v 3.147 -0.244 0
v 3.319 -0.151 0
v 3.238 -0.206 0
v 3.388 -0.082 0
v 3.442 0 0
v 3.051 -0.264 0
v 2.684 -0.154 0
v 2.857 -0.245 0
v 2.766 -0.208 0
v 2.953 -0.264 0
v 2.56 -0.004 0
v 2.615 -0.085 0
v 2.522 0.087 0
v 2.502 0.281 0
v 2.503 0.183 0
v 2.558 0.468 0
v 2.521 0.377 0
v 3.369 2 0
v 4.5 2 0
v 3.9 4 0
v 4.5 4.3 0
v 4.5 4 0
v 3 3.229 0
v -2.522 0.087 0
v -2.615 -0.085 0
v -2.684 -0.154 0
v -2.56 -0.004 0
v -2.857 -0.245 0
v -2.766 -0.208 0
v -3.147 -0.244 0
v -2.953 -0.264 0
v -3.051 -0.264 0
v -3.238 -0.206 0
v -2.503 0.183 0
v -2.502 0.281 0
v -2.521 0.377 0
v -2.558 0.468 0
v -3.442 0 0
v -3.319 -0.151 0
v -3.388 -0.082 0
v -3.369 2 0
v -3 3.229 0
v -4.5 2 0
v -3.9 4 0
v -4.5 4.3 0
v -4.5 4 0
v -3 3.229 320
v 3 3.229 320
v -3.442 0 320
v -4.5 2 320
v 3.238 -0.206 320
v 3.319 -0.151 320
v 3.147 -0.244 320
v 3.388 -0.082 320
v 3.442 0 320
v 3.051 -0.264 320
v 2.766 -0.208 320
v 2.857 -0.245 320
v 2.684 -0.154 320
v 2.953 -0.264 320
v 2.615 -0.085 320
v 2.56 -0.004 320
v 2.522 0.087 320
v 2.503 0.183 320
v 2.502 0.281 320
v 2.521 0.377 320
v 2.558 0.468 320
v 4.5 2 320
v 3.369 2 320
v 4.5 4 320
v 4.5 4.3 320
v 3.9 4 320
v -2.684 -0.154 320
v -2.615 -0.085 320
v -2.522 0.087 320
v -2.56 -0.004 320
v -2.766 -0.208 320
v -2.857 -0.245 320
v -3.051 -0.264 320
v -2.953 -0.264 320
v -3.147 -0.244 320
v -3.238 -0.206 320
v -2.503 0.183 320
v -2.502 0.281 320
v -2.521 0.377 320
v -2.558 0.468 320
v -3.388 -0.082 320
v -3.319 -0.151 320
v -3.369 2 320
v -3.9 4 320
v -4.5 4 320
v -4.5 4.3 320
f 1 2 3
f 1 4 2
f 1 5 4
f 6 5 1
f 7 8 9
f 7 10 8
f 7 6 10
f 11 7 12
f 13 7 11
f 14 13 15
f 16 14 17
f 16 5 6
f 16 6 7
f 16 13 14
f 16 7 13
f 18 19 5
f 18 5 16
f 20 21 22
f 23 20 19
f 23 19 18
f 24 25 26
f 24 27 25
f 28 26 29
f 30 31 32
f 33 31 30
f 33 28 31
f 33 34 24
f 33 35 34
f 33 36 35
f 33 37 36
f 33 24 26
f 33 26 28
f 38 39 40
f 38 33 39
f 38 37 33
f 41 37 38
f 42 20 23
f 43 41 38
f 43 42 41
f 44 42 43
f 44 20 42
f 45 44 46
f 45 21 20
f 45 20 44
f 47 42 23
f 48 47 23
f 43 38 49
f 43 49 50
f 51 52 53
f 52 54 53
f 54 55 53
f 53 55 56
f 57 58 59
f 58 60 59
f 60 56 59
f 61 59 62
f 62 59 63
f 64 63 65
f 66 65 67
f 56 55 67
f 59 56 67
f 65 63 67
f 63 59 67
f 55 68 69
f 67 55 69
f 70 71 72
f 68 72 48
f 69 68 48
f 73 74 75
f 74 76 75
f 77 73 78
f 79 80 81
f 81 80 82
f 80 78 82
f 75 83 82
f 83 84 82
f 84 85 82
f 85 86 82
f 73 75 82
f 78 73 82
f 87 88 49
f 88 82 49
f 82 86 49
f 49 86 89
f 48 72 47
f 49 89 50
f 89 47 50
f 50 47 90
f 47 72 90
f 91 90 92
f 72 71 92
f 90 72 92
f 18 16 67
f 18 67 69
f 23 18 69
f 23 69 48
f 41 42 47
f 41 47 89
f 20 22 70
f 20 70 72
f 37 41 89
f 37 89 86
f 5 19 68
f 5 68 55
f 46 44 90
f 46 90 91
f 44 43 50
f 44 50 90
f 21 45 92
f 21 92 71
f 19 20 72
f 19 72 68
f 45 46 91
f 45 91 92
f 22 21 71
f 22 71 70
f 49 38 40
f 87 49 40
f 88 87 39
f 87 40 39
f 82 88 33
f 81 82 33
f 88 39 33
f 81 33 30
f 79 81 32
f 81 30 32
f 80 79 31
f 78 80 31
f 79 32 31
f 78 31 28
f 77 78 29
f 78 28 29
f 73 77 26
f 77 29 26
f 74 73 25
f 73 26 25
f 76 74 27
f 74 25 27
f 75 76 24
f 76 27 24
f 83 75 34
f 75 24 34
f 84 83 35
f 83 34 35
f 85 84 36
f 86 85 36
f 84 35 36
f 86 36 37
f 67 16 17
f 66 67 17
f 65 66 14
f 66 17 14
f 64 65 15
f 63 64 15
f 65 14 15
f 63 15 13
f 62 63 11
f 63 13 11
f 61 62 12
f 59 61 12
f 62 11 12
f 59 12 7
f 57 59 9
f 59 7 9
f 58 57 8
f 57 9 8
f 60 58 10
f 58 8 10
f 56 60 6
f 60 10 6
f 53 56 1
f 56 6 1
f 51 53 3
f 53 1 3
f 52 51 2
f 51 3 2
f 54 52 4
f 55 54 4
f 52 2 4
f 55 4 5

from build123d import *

# Parameters (mm, degrees)
PAD_DEPTH = 320


with BuildPart() as part:
    # Sketch → Pad (new body)
    with BuildSketch(Plane.XY):
        with BuildLine():
            Line((-4.5, 4.3), (4.5, 4.3))
            Line((4.5, 4.3), (4.5, 4))
            Line((4.5, 4), (3.9, 4))
            Line((3.9, 4), (4.5, 2))
            Line((4.5, 2), (3.441966, 0))
            ThreePointArc((2.558034, 0.467615), (2.766192, -0.208159), (3.441966, 0))
            Line((2.558034, 0.467615), (3.368691, 2))
            Line((3.368691, 2), (3, 3.228972))
            Line((-3, 3.228972), (3, 3.228972))
            Line((-3, 3.228972), (-3.368691, 2))
            Line((-3.368691, 2), (-2.558034, 0.467615))
            ThreePointArc((-3.441966, 0), (-2.766192, -0.208159), (-2.558034, 0.467615))
            Line((-3.441966, 0), (-4.5, 2))
            Line((-4.5, 2), (-3.9, 4))
            Line((-3.9, 4), (-4.5, 4))
            Line((-4.5, 4), (-4.5, 4.3))
        make_face()
    extrude(amount=PAD_DEPTH)


solid = part.part
